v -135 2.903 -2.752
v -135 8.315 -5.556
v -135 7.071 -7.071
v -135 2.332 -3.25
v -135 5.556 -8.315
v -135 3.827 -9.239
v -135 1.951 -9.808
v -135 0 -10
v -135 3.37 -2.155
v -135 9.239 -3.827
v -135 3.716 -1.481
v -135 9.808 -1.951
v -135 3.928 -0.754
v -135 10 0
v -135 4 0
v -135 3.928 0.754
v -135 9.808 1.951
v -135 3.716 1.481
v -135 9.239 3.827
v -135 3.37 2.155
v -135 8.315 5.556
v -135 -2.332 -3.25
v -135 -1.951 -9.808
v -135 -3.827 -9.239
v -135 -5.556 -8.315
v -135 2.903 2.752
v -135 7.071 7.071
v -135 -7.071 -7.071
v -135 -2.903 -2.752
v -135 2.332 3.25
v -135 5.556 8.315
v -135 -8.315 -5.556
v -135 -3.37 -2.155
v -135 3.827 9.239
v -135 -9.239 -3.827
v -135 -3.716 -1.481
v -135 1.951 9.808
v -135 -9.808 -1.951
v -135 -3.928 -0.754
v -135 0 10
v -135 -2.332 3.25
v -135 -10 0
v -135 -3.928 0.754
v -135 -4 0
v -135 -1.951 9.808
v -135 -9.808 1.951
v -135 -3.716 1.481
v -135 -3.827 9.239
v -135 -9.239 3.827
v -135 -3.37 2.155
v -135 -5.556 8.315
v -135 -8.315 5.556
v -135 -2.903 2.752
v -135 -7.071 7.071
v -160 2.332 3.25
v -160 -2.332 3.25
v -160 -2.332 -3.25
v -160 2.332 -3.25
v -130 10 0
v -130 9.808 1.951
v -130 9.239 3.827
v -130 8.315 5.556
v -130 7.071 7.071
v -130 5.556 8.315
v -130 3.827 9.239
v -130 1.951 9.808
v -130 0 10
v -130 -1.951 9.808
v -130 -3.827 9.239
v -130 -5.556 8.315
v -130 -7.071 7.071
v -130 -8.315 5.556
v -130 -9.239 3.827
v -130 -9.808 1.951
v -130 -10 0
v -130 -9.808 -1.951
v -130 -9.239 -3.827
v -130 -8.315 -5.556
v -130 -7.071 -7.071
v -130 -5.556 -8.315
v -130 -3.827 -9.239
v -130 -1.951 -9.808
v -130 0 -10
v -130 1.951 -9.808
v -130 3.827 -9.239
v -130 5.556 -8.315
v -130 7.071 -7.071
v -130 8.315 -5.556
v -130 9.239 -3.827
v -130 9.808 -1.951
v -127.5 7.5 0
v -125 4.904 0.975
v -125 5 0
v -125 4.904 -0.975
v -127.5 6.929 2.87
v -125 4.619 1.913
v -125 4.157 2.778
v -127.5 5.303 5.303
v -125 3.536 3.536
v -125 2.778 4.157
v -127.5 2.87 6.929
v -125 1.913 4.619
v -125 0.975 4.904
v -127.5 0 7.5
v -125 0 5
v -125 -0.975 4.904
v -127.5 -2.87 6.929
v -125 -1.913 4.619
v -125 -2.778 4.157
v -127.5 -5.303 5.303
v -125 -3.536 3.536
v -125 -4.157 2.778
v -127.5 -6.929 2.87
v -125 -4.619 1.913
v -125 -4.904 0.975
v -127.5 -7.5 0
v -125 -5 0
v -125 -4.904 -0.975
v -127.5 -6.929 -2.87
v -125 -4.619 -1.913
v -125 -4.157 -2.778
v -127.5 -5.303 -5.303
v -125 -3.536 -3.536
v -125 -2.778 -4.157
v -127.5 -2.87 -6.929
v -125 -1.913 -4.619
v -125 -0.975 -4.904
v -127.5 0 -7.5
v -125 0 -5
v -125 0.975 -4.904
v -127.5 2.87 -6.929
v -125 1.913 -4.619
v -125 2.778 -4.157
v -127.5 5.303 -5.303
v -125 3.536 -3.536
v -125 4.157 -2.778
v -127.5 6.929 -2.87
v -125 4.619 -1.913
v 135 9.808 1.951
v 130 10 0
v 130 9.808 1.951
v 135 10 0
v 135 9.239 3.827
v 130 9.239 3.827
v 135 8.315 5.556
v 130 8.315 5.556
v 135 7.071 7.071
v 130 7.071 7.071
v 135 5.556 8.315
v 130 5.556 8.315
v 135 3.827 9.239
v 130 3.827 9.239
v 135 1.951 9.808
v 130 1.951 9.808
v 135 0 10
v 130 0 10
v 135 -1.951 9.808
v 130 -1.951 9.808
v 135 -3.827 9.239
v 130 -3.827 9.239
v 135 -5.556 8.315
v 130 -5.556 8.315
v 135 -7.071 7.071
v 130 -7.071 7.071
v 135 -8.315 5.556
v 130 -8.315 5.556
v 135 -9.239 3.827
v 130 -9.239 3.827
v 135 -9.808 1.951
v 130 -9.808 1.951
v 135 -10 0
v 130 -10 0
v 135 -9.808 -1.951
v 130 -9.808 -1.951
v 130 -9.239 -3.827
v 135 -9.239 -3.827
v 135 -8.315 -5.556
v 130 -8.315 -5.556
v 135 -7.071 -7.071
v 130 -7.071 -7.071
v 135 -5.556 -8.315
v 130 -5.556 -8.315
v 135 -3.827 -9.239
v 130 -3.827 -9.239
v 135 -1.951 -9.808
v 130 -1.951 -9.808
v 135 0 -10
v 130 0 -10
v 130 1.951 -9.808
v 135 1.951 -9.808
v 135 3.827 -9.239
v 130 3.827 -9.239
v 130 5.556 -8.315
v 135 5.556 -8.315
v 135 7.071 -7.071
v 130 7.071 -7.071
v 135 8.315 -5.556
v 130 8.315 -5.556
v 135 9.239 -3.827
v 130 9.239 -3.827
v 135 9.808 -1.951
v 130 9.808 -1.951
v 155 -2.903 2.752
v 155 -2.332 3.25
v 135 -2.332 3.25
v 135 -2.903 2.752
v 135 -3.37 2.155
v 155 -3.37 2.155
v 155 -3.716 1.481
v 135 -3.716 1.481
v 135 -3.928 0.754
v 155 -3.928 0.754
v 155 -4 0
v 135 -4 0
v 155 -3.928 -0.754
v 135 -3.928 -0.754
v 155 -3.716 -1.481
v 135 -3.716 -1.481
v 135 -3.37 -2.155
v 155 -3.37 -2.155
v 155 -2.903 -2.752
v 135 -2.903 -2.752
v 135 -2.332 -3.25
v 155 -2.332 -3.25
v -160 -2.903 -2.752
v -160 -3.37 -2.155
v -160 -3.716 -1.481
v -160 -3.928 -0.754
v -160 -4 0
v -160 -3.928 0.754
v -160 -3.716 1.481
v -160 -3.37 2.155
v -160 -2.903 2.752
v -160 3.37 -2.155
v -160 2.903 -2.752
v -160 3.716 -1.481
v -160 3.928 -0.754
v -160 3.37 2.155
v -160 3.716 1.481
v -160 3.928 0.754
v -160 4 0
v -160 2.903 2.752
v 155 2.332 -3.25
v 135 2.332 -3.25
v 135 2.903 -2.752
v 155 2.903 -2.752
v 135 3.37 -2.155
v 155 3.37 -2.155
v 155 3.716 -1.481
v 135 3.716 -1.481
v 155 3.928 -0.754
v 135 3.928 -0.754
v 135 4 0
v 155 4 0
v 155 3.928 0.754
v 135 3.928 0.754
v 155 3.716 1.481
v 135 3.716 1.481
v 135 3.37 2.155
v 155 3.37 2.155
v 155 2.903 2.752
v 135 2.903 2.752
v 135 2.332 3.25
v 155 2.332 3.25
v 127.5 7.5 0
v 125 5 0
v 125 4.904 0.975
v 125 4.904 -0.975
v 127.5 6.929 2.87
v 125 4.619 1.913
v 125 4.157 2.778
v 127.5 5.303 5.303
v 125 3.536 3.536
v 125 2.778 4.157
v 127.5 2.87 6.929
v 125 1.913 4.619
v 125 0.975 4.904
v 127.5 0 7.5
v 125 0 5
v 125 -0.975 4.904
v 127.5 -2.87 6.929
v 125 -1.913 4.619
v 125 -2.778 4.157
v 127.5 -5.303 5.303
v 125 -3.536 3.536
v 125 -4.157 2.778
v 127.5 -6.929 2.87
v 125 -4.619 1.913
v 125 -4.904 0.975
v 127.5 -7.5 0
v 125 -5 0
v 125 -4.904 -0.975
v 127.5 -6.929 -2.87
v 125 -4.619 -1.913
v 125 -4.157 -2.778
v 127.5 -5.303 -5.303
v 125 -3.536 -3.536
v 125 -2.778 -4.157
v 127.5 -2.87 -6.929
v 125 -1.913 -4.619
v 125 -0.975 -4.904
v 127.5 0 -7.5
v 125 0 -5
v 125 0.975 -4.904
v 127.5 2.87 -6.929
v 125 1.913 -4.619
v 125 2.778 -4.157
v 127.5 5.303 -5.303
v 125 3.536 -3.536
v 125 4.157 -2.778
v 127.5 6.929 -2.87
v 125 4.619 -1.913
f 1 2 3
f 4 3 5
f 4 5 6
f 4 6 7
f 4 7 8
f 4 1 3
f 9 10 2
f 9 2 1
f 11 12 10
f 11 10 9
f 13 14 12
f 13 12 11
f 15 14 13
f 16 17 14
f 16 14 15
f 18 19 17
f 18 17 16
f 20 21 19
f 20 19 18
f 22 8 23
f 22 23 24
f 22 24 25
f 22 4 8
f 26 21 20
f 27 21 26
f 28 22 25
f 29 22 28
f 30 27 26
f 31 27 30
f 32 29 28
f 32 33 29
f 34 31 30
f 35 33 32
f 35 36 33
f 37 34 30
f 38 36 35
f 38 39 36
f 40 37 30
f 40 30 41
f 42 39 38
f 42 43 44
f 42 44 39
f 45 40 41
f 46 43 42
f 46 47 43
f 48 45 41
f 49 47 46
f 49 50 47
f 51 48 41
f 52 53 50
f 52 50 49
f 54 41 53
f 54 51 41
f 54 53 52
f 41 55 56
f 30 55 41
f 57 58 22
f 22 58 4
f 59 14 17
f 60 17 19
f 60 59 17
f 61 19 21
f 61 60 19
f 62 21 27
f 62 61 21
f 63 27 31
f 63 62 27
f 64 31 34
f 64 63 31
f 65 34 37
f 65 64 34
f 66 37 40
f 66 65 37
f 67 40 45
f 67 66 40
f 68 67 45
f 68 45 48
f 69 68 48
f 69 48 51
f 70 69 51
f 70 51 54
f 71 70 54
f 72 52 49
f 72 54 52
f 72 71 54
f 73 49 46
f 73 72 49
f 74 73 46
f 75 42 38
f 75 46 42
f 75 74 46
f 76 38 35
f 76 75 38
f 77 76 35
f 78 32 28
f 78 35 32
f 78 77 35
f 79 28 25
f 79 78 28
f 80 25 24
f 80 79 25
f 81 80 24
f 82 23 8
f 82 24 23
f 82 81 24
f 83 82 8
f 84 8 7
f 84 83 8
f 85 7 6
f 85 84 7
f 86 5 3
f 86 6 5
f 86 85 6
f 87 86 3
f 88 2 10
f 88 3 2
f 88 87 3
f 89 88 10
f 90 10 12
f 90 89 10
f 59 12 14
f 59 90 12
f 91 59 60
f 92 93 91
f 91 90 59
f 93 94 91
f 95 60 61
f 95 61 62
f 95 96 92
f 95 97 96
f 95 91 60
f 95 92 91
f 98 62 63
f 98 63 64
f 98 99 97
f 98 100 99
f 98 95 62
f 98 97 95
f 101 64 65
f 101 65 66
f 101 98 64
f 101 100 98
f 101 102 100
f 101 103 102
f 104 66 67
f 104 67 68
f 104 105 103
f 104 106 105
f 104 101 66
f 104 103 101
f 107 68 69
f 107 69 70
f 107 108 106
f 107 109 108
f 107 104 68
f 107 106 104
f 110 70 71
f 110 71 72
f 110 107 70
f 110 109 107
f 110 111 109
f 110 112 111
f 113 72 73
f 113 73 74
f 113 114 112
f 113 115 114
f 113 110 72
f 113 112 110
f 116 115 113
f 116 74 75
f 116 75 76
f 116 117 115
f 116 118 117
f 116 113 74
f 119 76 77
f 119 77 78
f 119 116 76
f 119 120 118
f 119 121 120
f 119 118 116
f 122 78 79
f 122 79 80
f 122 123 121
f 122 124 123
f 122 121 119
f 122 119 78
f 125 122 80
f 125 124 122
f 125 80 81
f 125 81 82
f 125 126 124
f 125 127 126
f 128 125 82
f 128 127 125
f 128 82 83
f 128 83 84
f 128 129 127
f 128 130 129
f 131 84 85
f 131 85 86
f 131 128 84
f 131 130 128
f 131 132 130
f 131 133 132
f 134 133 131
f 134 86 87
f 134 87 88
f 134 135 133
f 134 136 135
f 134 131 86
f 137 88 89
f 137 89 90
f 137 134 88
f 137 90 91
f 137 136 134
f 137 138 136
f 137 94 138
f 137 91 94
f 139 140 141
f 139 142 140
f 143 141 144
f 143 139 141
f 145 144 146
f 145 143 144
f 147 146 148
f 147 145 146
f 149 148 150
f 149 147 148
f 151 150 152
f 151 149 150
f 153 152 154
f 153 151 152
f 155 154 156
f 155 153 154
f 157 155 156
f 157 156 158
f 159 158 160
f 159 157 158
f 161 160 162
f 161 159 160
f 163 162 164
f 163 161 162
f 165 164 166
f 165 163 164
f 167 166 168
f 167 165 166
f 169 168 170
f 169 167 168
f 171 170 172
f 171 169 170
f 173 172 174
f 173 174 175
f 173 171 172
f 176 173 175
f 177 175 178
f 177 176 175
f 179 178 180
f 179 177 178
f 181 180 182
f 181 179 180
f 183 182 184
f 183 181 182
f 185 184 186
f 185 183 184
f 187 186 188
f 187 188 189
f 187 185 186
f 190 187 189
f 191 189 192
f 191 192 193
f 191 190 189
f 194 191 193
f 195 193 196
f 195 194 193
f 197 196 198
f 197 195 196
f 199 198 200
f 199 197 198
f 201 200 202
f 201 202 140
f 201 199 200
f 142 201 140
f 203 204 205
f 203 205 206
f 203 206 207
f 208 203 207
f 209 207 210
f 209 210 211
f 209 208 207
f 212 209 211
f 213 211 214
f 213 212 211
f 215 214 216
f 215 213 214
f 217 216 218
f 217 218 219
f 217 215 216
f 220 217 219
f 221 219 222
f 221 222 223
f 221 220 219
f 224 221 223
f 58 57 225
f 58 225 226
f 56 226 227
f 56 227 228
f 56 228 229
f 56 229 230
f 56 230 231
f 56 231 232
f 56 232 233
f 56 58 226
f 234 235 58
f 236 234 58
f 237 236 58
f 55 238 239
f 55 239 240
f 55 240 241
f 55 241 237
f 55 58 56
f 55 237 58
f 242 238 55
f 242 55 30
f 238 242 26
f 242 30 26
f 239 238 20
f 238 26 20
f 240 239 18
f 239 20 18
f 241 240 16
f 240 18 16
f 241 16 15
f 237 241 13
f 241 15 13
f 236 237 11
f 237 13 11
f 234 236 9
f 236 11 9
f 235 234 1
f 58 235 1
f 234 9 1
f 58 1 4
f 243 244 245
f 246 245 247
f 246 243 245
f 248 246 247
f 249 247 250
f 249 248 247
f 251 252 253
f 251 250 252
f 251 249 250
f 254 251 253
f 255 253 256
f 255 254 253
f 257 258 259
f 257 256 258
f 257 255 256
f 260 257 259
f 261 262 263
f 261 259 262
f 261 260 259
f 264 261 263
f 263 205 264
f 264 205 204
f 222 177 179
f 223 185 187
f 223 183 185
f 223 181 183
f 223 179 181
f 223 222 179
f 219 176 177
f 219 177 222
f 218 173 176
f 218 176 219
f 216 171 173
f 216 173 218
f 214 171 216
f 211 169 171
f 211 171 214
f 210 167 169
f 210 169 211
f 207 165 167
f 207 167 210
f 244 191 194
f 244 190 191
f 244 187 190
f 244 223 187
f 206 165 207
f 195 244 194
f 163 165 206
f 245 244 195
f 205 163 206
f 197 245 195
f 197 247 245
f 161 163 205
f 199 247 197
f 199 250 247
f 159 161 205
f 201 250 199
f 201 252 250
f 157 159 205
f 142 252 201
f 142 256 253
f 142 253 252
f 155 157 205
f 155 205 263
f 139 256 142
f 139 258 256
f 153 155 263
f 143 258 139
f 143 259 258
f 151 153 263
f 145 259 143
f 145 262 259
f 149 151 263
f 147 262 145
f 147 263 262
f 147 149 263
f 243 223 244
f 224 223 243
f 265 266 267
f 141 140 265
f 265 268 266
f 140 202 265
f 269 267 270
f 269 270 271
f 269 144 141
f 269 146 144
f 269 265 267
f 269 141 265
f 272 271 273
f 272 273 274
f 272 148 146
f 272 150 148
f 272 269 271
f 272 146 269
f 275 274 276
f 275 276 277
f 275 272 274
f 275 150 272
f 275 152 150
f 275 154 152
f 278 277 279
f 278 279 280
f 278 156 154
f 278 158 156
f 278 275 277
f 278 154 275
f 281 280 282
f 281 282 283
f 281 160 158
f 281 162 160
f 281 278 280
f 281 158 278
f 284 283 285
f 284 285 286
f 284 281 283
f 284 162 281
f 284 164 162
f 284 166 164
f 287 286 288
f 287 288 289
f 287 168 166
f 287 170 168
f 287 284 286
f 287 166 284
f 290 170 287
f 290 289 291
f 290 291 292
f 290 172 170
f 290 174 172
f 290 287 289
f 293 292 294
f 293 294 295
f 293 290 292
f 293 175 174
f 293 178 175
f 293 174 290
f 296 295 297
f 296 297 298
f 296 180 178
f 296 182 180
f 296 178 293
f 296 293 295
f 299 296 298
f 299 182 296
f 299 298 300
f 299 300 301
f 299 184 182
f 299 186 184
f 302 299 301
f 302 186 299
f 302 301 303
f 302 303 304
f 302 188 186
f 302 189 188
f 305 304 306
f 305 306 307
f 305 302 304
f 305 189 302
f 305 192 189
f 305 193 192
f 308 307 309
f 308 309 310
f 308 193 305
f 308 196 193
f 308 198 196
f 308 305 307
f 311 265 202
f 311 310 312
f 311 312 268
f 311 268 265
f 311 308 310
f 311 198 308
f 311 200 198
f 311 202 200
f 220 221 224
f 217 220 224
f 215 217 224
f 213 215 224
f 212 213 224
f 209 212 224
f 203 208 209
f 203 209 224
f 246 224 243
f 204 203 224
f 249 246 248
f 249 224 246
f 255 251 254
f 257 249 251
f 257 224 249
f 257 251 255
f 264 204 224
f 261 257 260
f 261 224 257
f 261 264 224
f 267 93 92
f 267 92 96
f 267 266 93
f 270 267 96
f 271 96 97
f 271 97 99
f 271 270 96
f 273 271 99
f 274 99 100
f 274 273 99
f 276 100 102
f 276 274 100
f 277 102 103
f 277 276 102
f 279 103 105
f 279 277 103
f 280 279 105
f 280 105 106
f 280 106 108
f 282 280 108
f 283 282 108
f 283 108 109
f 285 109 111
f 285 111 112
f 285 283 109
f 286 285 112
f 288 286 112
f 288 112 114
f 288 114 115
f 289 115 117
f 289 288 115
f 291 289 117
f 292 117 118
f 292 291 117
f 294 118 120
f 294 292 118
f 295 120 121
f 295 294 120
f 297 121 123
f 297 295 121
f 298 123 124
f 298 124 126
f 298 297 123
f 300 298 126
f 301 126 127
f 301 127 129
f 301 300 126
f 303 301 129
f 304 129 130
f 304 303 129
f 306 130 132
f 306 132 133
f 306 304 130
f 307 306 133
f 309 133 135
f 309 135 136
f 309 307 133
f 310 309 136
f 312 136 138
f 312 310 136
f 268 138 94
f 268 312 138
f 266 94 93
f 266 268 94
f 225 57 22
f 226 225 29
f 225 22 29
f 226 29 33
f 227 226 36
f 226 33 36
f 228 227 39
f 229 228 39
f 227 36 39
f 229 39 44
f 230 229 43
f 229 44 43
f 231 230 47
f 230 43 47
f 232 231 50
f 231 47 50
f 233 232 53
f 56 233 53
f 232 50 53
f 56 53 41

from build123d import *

# Parameters (mm, degrees)
SKETCH3_R               = 4
BOSS_EXTRUDE3_DEPTH     = 5
SKETCH2_W               = 25
SKETCH2_H               = 0.75
SKETCH2_W_2             = 20
CUT_EXTRUDE1_DEPTH      = 11
CUT_EXTRUDE1_DEPTH_BACK = 11


with BuildPart() as part:
    # Sketch1 → Revolve3 (revolve)
    with BuildSketch(Plane.XY):
        Polygon((-125, 5), (125, 5), (130, 10), (135, 10), (135, 4), (155, 4), (155, 0), (-155, 0), (-155, 4), (-135, 4), (-135, 10), (-130, 10), align=None)
    revolve(axis=Axis((-25.367414289, 0, 0), (1, 0, 0)))

    # Sketch3 → Boss-Extrude3 (add)
    with BuildSketch(Plane.ZY.offset(155)):
        Circle(SKETCH3_R)
    extrude(amount=BOSS_EXTRUDE3_DEPTH)

    # Sketch2 → Cut-Extrude1 (cut, two sides)
    with BuildSketch(Plane(origin=(0, 0, 0), x_dir=(1, 0, 0), z_dir=(0, 1, 0))) as cut_extrude1_sk:
        with Locations((-147.5, 3.625)):
            Rectangle(SKETCH2_W, SKETCH2_H)
        with Locations((145, -3.625)):
            Rectangle(SKETCH2_W_2, SKETCH2_H)
        with Locations((145, 3.625)):
            Rectangle(SKETCH2_W_2, SKETCH2_H)
        with Locations((-147.5, -3.625)):
            Rectangle(SKETCH2_W, SKETCH2_H)
    extrude(amount=CUT_EXTRUDE1_DEPTH, mode=Mode.SUBTRACT)
    extrude(cut_extrude1_sk.sketch, amount=-CUT_EXTRUDE1_DEPTH_BACK, mode=Mode.SUBTRACT)


solid = part.part
